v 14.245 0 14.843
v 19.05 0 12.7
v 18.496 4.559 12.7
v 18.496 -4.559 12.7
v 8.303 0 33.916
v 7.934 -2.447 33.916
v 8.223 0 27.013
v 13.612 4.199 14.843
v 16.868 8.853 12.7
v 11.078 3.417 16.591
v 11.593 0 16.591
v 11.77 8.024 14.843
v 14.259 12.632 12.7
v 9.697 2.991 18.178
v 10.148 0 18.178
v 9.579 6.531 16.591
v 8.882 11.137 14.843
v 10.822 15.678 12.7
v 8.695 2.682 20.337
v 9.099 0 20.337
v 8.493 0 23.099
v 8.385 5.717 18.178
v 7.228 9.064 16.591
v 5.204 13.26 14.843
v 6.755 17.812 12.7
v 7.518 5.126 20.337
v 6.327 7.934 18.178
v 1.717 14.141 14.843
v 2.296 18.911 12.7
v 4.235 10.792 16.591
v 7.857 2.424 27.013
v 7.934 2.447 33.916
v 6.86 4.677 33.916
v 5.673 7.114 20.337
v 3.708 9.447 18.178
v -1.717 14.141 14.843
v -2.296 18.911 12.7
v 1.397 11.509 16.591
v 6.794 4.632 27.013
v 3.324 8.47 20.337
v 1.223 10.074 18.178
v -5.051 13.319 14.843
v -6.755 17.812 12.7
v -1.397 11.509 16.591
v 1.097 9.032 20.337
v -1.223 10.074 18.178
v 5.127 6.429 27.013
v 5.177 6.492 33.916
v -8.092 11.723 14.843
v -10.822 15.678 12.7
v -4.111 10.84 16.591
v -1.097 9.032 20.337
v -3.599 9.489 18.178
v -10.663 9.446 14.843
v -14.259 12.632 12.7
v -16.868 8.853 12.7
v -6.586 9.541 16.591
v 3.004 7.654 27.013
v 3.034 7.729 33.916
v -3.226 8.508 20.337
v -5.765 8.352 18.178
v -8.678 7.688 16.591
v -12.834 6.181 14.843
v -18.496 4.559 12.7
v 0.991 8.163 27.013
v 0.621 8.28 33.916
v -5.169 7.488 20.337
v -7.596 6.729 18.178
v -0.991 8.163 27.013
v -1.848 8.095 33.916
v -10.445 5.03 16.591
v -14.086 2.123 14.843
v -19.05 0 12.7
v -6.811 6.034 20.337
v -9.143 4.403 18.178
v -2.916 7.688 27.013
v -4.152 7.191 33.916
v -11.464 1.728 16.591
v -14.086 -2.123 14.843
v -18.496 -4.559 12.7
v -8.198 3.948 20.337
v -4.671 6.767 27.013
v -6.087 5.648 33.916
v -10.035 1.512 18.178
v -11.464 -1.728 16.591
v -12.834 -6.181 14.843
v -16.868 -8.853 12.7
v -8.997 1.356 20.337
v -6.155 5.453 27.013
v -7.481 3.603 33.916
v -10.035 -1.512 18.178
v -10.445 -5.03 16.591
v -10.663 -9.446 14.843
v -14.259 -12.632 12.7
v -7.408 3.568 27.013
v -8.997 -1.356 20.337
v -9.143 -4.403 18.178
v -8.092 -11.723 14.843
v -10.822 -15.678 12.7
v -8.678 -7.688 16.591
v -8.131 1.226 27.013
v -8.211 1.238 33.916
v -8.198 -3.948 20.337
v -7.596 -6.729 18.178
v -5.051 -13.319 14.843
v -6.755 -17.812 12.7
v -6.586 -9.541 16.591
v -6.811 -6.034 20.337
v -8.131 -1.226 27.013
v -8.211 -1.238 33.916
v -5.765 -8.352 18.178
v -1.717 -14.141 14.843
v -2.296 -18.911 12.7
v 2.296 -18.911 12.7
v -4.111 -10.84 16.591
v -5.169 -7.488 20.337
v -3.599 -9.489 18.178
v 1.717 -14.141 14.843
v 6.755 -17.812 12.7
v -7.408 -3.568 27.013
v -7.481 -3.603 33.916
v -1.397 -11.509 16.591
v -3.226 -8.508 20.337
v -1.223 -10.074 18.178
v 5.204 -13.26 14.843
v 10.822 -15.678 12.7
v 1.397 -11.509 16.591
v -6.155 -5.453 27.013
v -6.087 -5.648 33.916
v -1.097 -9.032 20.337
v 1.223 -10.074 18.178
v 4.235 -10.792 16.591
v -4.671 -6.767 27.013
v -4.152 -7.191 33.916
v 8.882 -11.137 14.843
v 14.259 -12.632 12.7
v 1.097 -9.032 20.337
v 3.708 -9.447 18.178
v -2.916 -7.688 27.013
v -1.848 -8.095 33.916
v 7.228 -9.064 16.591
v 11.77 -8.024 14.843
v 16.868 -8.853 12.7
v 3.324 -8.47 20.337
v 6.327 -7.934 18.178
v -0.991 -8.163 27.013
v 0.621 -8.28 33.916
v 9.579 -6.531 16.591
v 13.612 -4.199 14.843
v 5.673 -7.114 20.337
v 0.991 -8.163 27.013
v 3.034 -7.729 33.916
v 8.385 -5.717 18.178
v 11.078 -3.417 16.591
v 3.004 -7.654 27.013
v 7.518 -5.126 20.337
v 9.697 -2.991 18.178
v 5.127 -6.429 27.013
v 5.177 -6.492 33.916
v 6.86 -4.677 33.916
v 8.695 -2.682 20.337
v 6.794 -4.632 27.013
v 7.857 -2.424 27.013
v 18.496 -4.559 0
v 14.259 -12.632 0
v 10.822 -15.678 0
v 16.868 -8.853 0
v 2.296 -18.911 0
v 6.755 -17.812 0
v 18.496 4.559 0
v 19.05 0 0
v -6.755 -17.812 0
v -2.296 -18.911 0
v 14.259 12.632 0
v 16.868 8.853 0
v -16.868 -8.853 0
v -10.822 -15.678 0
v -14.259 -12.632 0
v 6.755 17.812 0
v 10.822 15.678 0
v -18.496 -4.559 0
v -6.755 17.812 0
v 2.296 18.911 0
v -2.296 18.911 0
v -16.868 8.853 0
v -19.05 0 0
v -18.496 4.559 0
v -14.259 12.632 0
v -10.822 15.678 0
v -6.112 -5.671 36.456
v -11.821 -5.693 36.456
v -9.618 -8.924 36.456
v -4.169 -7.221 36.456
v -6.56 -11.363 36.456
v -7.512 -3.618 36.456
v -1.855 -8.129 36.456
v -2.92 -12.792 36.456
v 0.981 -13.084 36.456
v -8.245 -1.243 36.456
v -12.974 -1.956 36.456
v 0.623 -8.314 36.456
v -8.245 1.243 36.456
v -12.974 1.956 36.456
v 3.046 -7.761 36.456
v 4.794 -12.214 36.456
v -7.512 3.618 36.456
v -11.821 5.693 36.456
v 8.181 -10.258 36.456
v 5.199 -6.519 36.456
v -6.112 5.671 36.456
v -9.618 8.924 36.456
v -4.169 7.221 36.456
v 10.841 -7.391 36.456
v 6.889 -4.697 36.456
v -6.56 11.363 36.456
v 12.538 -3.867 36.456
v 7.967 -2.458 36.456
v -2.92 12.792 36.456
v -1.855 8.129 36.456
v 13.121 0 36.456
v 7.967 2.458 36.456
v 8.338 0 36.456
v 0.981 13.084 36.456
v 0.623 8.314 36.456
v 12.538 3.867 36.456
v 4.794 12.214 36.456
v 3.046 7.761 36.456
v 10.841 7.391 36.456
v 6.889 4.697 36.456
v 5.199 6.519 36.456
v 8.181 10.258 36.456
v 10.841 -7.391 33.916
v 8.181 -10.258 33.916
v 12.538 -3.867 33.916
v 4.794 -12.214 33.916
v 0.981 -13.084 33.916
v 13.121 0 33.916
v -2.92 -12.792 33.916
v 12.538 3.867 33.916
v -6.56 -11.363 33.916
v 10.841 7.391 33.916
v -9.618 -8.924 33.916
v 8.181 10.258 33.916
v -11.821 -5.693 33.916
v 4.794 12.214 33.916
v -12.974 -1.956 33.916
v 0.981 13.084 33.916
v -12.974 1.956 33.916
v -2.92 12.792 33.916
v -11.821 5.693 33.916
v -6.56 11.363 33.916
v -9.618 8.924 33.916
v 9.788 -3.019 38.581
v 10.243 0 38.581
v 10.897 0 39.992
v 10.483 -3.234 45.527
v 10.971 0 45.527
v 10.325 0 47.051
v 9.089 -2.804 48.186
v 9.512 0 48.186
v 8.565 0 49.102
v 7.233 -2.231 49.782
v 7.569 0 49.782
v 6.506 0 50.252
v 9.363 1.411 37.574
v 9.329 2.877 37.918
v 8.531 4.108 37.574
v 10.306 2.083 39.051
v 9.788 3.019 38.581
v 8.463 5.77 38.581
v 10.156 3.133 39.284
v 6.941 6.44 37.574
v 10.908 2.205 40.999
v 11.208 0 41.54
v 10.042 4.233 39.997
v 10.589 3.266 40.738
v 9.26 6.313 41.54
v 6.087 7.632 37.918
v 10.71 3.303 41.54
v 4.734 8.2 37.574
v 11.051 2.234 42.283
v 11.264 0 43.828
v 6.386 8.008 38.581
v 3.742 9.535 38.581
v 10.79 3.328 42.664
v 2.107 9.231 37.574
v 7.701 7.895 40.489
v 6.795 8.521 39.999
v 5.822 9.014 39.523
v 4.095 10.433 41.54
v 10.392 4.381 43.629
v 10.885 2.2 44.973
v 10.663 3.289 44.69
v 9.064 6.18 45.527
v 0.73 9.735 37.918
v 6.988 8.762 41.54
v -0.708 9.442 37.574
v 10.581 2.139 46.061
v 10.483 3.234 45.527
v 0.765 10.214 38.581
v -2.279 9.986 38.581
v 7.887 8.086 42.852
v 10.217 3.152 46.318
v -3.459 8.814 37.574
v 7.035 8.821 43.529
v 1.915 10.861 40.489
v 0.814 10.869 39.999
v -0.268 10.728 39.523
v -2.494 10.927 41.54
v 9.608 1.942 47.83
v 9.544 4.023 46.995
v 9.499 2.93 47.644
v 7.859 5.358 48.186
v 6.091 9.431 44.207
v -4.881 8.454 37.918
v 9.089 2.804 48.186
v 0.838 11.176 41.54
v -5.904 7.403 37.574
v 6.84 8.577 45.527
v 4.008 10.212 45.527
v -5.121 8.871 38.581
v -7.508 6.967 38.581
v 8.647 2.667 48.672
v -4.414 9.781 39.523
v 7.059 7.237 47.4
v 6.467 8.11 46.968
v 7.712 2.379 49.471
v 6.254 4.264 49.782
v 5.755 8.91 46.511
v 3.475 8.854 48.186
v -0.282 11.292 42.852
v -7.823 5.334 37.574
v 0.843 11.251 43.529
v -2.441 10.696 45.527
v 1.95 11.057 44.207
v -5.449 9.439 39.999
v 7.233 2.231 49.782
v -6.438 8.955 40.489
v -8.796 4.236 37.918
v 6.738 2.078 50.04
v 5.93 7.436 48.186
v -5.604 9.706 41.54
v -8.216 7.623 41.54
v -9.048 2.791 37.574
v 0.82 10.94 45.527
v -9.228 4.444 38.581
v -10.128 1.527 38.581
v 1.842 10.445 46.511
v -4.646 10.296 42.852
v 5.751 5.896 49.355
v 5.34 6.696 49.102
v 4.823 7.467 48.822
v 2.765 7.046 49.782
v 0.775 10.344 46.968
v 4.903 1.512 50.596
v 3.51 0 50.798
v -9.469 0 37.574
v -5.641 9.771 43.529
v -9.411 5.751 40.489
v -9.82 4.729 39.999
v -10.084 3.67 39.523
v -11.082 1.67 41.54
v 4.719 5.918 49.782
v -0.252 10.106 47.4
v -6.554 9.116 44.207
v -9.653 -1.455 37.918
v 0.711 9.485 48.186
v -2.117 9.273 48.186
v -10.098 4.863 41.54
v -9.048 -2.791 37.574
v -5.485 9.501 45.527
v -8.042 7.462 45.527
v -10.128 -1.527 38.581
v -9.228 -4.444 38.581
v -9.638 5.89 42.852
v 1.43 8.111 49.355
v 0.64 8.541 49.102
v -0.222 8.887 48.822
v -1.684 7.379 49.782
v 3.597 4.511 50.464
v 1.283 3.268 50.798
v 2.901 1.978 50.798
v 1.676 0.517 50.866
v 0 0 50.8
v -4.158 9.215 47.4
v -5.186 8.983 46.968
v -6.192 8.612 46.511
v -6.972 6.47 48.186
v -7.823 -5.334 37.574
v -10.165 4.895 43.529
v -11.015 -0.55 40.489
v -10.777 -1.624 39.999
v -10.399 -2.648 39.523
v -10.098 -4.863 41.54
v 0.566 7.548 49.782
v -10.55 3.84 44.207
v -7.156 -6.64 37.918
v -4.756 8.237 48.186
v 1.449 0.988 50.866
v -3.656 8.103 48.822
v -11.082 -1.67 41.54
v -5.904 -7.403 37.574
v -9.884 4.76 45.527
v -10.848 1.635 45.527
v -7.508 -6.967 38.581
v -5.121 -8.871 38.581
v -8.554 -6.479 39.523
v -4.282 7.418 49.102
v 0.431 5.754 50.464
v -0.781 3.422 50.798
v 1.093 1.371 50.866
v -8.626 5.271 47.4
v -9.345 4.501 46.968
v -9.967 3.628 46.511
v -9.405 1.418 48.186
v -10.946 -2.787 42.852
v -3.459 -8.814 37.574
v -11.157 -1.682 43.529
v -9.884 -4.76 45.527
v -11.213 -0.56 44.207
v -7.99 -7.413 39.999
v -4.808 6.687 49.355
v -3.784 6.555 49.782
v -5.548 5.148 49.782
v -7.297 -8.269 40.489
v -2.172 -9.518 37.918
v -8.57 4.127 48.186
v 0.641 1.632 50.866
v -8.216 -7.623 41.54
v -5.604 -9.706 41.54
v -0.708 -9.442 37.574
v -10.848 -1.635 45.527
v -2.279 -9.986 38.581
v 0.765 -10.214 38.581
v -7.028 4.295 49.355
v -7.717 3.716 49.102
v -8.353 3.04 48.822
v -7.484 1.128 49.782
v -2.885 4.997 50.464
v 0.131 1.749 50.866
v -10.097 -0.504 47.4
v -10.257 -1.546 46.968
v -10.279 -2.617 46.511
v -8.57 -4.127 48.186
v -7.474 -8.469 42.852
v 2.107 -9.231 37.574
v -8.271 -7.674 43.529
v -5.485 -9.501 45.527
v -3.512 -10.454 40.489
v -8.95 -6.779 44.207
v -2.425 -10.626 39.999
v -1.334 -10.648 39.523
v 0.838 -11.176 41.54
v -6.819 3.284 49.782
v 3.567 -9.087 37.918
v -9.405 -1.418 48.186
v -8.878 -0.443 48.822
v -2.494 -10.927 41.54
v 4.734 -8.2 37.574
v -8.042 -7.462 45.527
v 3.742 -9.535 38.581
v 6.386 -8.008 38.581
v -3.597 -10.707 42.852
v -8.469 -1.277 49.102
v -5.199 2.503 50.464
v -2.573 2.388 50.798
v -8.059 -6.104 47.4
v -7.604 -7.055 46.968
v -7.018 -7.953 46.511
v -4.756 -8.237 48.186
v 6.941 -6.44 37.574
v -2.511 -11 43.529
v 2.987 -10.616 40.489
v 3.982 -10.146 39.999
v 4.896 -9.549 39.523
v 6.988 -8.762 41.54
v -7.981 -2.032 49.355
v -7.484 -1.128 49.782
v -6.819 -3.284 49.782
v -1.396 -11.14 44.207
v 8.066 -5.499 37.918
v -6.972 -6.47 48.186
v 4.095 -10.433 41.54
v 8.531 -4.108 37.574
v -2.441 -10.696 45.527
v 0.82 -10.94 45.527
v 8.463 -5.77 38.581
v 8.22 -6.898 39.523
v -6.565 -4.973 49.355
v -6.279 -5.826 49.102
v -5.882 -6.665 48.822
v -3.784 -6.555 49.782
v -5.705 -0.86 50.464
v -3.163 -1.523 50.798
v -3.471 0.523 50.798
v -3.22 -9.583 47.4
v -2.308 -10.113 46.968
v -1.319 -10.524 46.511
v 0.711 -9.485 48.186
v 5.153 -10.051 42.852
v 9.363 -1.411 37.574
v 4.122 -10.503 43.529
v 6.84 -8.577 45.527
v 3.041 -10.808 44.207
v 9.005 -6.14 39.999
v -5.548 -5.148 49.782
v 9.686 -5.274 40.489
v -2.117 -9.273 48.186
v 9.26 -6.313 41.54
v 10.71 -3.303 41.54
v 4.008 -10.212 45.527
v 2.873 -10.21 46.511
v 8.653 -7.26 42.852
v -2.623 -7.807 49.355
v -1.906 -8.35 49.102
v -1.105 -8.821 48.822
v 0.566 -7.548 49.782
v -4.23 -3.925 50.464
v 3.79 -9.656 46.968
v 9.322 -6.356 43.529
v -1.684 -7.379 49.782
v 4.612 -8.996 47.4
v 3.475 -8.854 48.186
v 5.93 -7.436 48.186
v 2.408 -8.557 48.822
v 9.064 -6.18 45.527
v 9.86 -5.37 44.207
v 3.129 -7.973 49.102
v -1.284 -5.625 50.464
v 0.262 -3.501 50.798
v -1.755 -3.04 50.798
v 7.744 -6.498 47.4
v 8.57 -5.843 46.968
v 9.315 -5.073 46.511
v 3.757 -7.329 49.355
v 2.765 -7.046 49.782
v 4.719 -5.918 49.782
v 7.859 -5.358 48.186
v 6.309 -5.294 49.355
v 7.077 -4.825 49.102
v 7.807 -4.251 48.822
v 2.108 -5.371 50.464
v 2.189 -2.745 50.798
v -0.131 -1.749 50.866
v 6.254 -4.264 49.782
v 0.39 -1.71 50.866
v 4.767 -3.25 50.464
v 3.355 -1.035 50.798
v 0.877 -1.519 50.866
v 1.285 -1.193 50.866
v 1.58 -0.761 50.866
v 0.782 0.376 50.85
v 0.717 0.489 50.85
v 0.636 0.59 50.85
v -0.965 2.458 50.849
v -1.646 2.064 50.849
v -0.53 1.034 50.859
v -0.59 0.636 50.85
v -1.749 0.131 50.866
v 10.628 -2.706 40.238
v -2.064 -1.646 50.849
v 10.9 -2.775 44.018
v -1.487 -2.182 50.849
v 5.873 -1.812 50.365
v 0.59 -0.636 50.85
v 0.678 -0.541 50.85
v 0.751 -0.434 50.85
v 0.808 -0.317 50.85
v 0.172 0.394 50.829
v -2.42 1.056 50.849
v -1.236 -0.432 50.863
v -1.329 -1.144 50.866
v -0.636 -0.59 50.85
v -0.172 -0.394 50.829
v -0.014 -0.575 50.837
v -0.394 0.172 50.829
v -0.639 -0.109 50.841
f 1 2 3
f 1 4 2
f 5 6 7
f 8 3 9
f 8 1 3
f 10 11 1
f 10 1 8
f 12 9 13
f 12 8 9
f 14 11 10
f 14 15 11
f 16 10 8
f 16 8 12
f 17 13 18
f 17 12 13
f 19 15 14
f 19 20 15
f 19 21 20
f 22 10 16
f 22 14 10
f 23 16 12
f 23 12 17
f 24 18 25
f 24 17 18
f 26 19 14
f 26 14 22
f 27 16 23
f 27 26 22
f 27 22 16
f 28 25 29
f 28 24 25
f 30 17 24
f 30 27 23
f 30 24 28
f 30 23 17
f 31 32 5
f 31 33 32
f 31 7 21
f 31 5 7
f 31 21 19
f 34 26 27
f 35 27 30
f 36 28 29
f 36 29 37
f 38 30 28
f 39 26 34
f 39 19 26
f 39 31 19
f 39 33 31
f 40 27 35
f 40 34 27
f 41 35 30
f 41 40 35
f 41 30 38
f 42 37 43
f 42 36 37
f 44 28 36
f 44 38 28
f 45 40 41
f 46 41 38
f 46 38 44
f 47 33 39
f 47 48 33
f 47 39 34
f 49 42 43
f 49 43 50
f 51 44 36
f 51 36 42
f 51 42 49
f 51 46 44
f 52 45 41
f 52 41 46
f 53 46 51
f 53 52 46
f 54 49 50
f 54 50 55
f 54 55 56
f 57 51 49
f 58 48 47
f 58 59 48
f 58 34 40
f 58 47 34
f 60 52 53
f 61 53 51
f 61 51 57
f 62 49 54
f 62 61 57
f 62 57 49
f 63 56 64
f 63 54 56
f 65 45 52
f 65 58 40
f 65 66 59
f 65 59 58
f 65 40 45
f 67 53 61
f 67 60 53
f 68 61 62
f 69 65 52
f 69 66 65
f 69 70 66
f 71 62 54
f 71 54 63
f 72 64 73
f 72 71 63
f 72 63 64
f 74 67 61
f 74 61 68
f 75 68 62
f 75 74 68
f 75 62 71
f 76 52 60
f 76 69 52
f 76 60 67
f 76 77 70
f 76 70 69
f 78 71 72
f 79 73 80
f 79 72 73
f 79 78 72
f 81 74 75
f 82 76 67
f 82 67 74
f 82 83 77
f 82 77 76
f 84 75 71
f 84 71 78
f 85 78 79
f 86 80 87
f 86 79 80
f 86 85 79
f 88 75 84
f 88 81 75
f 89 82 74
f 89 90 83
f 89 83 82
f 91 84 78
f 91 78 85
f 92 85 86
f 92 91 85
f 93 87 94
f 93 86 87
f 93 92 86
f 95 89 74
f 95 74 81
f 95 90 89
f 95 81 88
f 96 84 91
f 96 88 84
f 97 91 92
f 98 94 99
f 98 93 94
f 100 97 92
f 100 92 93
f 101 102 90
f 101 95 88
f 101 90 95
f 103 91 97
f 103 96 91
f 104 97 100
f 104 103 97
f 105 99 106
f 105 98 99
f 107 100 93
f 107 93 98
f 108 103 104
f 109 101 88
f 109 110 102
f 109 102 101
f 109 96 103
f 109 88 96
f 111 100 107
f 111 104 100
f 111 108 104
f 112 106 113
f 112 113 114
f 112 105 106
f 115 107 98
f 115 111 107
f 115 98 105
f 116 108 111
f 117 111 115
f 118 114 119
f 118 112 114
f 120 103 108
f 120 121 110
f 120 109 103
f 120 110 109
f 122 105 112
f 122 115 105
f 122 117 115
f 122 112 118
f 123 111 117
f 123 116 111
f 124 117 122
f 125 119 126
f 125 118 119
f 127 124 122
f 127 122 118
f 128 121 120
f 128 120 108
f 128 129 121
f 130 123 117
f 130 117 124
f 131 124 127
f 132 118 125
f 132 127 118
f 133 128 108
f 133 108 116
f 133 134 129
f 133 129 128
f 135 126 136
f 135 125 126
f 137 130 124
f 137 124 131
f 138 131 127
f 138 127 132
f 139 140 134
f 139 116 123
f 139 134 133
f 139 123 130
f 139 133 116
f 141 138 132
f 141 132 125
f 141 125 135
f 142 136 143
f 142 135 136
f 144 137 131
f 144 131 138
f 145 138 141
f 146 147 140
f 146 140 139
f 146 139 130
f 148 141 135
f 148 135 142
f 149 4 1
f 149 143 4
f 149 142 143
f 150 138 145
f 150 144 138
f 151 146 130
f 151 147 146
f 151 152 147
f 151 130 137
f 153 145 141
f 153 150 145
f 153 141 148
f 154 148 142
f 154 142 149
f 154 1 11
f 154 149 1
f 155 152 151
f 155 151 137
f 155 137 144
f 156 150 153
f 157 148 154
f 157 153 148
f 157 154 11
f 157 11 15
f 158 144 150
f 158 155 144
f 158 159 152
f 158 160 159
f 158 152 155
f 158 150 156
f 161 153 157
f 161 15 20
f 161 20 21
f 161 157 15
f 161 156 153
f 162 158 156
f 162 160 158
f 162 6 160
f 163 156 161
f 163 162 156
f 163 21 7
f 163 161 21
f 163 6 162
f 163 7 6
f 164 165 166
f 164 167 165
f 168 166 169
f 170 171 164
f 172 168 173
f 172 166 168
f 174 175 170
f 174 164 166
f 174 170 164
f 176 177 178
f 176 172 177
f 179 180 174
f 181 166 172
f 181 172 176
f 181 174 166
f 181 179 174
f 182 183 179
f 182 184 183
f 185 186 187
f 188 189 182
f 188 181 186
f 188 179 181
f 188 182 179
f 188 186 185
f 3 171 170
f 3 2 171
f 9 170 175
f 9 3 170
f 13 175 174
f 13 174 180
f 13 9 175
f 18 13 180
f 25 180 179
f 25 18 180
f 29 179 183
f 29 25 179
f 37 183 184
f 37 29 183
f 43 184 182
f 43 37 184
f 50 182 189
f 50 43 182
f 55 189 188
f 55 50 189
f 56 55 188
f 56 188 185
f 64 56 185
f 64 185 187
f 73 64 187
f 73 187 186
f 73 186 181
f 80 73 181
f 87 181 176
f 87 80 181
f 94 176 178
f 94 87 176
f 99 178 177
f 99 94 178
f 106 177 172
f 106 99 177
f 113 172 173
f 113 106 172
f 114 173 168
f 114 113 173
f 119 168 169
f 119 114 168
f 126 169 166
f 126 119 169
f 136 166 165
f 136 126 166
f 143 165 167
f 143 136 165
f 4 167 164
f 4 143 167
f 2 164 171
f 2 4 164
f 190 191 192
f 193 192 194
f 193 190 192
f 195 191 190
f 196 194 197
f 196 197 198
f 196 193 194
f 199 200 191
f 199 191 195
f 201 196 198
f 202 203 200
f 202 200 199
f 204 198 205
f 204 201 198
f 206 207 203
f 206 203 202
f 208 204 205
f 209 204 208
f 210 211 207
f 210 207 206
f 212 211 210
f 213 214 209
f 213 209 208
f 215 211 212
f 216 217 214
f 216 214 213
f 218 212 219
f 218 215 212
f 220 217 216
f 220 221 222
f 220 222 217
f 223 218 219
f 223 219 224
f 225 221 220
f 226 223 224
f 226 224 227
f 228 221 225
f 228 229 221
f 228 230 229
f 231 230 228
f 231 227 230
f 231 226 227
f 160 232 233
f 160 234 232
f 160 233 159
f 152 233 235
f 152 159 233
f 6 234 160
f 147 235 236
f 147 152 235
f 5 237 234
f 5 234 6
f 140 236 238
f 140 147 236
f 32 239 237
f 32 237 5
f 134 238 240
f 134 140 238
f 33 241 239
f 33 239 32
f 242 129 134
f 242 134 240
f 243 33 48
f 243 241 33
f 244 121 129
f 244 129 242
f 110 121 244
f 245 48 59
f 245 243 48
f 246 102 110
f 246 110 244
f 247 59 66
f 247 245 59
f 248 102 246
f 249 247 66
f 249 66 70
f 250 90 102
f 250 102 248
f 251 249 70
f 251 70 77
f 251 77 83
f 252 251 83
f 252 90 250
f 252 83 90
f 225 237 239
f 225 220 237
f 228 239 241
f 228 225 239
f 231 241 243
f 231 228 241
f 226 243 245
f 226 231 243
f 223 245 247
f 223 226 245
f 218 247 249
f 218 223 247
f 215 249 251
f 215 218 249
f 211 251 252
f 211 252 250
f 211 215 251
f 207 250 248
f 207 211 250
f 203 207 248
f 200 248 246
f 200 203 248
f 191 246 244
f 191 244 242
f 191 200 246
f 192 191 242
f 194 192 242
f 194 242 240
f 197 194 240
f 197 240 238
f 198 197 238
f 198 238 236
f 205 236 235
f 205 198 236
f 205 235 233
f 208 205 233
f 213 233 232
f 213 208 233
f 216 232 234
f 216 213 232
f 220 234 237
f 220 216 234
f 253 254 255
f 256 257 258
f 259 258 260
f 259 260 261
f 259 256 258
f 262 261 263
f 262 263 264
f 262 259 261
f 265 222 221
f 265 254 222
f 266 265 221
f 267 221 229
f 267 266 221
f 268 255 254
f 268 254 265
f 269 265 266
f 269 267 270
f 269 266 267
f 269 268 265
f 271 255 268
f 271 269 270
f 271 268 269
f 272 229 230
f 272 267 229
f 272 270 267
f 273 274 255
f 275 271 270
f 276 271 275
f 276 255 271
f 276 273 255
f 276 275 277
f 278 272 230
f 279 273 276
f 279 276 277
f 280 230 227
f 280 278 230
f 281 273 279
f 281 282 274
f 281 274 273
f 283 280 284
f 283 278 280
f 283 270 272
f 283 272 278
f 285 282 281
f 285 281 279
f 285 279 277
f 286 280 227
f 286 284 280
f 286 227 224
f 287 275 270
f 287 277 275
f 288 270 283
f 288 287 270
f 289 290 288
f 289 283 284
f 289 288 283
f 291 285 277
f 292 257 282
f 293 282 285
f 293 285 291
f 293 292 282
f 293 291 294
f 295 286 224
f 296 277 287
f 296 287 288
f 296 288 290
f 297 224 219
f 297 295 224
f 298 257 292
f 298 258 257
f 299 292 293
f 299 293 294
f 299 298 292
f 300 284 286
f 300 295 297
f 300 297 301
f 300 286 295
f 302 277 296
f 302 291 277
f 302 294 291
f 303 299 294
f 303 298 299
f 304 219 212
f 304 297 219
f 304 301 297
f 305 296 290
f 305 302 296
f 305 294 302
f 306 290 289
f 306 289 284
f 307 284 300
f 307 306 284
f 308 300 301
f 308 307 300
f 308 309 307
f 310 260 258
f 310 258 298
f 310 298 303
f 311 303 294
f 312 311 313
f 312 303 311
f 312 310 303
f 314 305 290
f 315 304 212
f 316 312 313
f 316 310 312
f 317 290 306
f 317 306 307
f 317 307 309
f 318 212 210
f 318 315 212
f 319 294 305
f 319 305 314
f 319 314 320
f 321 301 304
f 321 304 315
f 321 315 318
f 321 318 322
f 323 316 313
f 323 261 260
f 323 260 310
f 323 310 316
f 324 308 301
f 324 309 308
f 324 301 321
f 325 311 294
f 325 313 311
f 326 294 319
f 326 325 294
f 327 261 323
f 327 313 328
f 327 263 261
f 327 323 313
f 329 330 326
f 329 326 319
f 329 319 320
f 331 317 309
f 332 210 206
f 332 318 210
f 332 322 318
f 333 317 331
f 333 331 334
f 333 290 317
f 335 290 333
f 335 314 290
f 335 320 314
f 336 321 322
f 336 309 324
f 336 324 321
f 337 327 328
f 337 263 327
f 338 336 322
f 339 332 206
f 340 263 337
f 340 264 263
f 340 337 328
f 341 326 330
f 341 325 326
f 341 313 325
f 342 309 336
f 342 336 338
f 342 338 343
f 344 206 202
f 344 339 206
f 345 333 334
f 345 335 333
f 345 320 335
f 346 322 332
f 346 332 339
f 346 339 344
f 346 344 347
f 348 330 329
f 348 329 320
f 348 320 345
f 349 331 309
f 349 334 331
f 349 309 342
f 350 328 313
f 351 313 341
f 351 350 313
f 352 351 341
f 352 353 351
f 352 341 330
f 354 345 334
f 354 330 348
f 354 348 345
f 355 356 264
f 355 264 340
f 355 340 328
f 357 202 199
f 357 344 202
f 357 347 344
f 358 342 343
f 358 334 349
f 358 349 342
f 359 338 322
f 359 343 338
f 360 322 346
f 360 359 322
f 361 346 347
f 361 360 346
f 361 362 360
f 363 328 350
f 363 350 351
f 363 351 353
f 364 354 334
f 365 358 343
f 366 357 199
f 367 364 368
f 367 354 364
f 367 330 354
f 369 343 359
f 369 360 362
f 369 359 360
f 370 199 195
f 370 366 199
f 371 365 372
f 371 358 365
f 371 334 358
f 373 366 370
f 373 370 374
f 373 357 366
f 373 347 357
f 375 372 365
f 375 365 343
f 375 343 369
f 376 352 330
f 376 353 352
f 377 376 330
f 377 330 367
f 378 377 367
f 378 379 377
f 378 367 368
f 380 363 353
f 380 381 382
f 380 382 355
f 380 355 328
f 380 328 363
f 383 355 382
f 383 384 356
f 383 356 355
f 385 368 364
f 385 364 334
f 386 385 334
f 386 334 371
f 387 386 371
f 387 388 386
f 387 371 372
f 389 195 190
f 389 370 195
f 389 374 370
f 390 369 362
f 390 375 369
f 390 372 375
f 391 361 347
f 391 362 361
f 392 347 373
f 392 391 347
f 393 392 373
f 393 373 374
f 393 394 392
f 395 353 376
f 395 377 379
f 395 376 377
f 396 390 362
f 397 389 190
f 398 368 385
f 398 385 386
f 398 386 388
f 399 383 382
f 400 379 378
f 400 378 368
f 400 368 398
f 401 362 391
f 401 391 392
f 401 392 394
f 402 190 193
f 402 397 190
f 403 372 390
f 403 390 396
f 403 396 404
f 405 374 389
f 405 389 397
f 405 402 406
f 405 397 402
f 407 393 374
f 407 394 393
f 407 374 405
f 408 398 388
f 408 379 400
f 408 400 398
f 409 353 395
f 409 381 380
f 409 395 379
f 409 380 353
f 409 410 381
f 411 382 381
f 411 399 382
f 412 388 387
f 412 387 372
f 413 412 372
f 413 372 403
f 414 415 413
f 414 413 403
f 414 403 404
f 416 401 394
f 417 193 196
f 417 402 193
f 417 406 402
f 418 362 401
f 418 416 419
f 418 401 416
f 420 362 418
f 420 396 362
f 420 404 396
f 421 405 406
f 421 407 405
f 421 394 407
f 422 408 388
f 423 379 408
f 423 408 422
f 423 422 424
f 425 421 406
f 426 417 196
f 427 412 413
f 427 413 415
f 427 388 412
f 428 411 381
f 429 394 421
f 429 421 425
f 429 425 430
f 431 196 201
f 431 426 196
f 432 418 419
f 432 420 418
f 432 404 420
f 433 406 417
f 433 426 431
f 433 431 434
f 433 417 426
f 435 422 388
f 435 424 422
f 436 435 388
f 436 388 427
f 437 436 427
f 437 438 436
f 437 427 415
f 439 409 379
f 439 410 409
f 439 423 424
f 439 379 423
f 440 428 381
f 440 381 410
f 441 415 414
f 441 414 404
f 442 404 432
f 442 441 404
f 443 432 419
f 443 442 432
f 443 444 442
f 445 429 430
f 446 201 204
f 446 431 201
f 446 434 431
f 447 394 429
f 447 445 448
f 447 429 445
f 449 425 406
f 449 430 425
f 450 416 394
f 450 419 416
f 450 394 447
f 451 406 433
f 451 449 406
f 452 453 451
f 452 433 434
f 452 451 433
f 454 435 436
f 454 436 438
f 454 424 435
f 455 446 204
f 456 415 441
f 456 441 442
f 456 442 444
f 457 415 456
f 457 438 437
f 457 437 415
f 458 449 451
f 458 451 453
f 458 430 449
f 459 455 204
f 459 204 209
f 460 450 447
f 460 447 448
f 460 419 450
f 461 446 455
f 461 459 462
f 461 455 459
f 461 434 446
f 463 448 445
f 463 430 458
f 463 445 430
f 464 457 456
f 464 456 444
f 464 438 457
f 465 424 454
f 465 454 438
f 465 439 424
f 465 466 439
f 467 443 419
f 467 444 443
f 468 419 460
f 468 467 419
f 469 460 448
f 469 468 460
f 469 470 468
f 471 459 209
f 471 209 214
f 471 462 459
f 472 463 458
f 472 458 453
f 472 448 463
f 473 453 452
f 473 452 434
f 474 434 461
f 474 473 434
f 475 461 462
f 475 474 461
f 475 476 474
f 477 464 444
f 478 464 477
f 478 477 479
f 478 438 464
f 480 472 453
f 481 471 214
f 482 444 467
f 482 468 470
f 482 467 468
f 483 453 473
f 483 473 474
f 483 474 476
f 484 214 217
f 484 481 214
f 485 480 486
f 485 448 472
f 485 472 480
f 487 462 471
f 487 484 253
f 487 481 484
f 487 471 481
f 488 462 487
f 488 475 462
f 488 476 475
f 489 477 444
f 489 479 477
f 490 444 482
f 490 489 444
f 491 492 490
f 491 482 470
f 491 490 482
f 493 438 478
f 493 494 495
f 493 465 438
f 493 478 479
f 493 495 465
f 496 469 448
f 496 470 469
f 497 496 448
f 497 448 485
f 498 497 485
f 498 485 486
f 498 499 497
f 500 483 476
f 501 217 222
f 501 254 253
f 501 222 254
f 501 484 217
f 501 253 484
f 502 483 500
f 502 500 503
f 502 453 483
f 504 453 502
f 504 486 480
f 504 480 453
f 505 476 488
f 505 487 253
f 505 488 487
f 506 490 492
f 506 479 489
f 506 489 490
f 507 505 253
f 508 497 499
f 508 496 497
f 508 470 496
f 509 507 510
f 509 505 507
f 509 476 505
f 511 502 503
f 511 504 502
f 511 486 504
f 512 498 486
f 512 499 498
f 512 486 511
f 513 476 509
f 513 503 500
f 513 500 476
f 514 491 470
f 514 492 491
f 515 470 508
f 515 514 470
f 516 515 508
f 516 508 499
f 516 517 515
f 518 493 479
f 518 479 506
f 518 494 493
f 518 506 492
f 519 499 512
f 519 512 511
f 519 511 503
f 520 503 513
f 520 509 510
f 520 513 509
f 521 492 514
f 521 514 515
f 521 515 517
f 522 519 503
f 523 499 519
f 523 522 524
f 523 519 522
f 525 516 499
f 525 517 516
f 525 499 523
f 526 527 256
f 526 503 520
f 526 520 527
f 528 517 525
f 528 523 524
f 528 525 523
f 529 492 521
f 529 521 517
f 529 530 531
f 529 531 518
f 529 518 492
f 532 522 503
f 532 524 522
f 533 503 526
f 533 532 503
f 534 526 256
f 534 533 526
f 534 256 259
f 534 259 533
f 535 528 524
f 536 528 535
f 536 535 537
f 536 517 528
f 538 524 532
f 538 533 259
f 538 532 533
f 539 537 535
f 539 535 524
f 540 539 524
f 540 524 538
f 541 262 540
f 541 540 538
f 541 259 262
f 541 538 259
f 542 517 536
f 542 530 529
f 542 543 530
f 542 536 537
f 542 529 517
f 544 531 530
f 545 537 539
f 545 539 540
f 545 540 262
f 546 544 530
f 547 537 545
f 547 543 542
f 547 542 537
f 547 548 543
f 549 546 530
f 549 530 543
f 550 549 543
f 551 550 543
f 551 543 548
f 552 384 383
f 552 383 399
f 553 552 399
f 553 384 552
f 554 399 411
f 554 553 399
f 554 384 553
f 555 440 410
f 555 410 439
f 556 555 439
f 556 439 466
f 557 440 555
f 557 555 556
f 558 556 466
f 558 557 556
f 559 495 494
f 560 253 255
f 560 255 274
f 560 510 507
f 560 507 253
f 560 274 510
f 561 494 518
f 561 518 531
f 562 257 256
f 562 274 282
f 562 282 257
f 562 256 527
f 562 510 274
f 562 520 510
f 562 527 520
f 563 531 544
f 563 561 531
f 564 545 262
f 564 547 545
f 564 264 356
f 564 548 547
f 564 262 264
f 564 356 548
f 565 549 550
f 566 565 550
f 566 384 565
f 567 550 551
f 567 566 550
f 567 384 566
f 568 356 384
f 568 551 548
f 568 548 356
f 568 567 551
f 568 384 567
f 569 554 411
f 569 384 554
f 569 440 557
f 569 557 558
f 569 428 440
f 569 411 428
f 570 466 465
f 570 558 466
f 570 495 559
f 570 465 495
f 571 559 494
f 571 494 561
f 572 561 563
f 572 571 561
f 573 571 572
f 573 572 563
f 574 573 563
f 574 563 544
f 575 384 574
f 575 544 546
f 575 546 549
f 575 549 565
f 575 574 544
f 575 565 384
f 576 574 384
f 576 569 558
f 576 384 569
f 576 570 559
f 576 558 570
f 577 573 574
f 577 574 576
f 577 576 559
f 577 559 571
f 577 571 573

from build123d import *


with BuildPart() as f1:
    # F0 (on Front) → F1 (revolve)
    with BuildSketch(Plane.XZ):
        Polygon((0, 36.456387707), (0, 33.916387707), (8.3032539114, 33.916387707), (13.1206531078, 33.916387707), (13.1206531078, 36.456387707), (8.3377687261, 36.456387707), align=None)
        with BuildLine():
            Line((0, 33.916387707), (0, 0))
            Line((0, 0), (19.05, 0))
            Line((19.05, 0), (19.05, 12.7))
            add(Edge.make_bspline(
                [(19.05, 12.7), (15.6836506907, 14.0721710831), (9.3393919334, 16.6581797265), (8.0395309284, 25.3025272106), (8.2135911581, 30.9877751162), (8.3032539114, 33.916387707)],
                knots=[0, 0, 0, 0, 0.3540562683, 0.6672583189, 1, 1, 1, 1], degree=3))
            Line((8.3032539114, 33.916387707), (0, 33.916387707))
        make_face()
        with BuildLine():
            Line((0, 50.8), (0, 36.456387707))
            Line((0, 36.456387707), (8.3377687261, 36.456387707))
            add(Edge.make_bspline(
                [(8.3377687261, 36.456387707), (10.3048640053, 38.2170454213), (11.3878356839, 40.544651372), (11.392239415, 46.1874953748), (8.3974127327, 49.5973153016), (5.2773343635, 50.7991233773), (1.7471459357, 50.9378901576), (0, 50.8)],
                knots=[0, 0, 0, 0, 0.2154525637, 0.4253980018, 0.6169348664, 0.7858471635, 1, 1, 1, 1], degree=3))
        make_face()
    revolve(axis=Axis((0, 0, 25.4), (0, 0, 1)))


solid = f1.part
